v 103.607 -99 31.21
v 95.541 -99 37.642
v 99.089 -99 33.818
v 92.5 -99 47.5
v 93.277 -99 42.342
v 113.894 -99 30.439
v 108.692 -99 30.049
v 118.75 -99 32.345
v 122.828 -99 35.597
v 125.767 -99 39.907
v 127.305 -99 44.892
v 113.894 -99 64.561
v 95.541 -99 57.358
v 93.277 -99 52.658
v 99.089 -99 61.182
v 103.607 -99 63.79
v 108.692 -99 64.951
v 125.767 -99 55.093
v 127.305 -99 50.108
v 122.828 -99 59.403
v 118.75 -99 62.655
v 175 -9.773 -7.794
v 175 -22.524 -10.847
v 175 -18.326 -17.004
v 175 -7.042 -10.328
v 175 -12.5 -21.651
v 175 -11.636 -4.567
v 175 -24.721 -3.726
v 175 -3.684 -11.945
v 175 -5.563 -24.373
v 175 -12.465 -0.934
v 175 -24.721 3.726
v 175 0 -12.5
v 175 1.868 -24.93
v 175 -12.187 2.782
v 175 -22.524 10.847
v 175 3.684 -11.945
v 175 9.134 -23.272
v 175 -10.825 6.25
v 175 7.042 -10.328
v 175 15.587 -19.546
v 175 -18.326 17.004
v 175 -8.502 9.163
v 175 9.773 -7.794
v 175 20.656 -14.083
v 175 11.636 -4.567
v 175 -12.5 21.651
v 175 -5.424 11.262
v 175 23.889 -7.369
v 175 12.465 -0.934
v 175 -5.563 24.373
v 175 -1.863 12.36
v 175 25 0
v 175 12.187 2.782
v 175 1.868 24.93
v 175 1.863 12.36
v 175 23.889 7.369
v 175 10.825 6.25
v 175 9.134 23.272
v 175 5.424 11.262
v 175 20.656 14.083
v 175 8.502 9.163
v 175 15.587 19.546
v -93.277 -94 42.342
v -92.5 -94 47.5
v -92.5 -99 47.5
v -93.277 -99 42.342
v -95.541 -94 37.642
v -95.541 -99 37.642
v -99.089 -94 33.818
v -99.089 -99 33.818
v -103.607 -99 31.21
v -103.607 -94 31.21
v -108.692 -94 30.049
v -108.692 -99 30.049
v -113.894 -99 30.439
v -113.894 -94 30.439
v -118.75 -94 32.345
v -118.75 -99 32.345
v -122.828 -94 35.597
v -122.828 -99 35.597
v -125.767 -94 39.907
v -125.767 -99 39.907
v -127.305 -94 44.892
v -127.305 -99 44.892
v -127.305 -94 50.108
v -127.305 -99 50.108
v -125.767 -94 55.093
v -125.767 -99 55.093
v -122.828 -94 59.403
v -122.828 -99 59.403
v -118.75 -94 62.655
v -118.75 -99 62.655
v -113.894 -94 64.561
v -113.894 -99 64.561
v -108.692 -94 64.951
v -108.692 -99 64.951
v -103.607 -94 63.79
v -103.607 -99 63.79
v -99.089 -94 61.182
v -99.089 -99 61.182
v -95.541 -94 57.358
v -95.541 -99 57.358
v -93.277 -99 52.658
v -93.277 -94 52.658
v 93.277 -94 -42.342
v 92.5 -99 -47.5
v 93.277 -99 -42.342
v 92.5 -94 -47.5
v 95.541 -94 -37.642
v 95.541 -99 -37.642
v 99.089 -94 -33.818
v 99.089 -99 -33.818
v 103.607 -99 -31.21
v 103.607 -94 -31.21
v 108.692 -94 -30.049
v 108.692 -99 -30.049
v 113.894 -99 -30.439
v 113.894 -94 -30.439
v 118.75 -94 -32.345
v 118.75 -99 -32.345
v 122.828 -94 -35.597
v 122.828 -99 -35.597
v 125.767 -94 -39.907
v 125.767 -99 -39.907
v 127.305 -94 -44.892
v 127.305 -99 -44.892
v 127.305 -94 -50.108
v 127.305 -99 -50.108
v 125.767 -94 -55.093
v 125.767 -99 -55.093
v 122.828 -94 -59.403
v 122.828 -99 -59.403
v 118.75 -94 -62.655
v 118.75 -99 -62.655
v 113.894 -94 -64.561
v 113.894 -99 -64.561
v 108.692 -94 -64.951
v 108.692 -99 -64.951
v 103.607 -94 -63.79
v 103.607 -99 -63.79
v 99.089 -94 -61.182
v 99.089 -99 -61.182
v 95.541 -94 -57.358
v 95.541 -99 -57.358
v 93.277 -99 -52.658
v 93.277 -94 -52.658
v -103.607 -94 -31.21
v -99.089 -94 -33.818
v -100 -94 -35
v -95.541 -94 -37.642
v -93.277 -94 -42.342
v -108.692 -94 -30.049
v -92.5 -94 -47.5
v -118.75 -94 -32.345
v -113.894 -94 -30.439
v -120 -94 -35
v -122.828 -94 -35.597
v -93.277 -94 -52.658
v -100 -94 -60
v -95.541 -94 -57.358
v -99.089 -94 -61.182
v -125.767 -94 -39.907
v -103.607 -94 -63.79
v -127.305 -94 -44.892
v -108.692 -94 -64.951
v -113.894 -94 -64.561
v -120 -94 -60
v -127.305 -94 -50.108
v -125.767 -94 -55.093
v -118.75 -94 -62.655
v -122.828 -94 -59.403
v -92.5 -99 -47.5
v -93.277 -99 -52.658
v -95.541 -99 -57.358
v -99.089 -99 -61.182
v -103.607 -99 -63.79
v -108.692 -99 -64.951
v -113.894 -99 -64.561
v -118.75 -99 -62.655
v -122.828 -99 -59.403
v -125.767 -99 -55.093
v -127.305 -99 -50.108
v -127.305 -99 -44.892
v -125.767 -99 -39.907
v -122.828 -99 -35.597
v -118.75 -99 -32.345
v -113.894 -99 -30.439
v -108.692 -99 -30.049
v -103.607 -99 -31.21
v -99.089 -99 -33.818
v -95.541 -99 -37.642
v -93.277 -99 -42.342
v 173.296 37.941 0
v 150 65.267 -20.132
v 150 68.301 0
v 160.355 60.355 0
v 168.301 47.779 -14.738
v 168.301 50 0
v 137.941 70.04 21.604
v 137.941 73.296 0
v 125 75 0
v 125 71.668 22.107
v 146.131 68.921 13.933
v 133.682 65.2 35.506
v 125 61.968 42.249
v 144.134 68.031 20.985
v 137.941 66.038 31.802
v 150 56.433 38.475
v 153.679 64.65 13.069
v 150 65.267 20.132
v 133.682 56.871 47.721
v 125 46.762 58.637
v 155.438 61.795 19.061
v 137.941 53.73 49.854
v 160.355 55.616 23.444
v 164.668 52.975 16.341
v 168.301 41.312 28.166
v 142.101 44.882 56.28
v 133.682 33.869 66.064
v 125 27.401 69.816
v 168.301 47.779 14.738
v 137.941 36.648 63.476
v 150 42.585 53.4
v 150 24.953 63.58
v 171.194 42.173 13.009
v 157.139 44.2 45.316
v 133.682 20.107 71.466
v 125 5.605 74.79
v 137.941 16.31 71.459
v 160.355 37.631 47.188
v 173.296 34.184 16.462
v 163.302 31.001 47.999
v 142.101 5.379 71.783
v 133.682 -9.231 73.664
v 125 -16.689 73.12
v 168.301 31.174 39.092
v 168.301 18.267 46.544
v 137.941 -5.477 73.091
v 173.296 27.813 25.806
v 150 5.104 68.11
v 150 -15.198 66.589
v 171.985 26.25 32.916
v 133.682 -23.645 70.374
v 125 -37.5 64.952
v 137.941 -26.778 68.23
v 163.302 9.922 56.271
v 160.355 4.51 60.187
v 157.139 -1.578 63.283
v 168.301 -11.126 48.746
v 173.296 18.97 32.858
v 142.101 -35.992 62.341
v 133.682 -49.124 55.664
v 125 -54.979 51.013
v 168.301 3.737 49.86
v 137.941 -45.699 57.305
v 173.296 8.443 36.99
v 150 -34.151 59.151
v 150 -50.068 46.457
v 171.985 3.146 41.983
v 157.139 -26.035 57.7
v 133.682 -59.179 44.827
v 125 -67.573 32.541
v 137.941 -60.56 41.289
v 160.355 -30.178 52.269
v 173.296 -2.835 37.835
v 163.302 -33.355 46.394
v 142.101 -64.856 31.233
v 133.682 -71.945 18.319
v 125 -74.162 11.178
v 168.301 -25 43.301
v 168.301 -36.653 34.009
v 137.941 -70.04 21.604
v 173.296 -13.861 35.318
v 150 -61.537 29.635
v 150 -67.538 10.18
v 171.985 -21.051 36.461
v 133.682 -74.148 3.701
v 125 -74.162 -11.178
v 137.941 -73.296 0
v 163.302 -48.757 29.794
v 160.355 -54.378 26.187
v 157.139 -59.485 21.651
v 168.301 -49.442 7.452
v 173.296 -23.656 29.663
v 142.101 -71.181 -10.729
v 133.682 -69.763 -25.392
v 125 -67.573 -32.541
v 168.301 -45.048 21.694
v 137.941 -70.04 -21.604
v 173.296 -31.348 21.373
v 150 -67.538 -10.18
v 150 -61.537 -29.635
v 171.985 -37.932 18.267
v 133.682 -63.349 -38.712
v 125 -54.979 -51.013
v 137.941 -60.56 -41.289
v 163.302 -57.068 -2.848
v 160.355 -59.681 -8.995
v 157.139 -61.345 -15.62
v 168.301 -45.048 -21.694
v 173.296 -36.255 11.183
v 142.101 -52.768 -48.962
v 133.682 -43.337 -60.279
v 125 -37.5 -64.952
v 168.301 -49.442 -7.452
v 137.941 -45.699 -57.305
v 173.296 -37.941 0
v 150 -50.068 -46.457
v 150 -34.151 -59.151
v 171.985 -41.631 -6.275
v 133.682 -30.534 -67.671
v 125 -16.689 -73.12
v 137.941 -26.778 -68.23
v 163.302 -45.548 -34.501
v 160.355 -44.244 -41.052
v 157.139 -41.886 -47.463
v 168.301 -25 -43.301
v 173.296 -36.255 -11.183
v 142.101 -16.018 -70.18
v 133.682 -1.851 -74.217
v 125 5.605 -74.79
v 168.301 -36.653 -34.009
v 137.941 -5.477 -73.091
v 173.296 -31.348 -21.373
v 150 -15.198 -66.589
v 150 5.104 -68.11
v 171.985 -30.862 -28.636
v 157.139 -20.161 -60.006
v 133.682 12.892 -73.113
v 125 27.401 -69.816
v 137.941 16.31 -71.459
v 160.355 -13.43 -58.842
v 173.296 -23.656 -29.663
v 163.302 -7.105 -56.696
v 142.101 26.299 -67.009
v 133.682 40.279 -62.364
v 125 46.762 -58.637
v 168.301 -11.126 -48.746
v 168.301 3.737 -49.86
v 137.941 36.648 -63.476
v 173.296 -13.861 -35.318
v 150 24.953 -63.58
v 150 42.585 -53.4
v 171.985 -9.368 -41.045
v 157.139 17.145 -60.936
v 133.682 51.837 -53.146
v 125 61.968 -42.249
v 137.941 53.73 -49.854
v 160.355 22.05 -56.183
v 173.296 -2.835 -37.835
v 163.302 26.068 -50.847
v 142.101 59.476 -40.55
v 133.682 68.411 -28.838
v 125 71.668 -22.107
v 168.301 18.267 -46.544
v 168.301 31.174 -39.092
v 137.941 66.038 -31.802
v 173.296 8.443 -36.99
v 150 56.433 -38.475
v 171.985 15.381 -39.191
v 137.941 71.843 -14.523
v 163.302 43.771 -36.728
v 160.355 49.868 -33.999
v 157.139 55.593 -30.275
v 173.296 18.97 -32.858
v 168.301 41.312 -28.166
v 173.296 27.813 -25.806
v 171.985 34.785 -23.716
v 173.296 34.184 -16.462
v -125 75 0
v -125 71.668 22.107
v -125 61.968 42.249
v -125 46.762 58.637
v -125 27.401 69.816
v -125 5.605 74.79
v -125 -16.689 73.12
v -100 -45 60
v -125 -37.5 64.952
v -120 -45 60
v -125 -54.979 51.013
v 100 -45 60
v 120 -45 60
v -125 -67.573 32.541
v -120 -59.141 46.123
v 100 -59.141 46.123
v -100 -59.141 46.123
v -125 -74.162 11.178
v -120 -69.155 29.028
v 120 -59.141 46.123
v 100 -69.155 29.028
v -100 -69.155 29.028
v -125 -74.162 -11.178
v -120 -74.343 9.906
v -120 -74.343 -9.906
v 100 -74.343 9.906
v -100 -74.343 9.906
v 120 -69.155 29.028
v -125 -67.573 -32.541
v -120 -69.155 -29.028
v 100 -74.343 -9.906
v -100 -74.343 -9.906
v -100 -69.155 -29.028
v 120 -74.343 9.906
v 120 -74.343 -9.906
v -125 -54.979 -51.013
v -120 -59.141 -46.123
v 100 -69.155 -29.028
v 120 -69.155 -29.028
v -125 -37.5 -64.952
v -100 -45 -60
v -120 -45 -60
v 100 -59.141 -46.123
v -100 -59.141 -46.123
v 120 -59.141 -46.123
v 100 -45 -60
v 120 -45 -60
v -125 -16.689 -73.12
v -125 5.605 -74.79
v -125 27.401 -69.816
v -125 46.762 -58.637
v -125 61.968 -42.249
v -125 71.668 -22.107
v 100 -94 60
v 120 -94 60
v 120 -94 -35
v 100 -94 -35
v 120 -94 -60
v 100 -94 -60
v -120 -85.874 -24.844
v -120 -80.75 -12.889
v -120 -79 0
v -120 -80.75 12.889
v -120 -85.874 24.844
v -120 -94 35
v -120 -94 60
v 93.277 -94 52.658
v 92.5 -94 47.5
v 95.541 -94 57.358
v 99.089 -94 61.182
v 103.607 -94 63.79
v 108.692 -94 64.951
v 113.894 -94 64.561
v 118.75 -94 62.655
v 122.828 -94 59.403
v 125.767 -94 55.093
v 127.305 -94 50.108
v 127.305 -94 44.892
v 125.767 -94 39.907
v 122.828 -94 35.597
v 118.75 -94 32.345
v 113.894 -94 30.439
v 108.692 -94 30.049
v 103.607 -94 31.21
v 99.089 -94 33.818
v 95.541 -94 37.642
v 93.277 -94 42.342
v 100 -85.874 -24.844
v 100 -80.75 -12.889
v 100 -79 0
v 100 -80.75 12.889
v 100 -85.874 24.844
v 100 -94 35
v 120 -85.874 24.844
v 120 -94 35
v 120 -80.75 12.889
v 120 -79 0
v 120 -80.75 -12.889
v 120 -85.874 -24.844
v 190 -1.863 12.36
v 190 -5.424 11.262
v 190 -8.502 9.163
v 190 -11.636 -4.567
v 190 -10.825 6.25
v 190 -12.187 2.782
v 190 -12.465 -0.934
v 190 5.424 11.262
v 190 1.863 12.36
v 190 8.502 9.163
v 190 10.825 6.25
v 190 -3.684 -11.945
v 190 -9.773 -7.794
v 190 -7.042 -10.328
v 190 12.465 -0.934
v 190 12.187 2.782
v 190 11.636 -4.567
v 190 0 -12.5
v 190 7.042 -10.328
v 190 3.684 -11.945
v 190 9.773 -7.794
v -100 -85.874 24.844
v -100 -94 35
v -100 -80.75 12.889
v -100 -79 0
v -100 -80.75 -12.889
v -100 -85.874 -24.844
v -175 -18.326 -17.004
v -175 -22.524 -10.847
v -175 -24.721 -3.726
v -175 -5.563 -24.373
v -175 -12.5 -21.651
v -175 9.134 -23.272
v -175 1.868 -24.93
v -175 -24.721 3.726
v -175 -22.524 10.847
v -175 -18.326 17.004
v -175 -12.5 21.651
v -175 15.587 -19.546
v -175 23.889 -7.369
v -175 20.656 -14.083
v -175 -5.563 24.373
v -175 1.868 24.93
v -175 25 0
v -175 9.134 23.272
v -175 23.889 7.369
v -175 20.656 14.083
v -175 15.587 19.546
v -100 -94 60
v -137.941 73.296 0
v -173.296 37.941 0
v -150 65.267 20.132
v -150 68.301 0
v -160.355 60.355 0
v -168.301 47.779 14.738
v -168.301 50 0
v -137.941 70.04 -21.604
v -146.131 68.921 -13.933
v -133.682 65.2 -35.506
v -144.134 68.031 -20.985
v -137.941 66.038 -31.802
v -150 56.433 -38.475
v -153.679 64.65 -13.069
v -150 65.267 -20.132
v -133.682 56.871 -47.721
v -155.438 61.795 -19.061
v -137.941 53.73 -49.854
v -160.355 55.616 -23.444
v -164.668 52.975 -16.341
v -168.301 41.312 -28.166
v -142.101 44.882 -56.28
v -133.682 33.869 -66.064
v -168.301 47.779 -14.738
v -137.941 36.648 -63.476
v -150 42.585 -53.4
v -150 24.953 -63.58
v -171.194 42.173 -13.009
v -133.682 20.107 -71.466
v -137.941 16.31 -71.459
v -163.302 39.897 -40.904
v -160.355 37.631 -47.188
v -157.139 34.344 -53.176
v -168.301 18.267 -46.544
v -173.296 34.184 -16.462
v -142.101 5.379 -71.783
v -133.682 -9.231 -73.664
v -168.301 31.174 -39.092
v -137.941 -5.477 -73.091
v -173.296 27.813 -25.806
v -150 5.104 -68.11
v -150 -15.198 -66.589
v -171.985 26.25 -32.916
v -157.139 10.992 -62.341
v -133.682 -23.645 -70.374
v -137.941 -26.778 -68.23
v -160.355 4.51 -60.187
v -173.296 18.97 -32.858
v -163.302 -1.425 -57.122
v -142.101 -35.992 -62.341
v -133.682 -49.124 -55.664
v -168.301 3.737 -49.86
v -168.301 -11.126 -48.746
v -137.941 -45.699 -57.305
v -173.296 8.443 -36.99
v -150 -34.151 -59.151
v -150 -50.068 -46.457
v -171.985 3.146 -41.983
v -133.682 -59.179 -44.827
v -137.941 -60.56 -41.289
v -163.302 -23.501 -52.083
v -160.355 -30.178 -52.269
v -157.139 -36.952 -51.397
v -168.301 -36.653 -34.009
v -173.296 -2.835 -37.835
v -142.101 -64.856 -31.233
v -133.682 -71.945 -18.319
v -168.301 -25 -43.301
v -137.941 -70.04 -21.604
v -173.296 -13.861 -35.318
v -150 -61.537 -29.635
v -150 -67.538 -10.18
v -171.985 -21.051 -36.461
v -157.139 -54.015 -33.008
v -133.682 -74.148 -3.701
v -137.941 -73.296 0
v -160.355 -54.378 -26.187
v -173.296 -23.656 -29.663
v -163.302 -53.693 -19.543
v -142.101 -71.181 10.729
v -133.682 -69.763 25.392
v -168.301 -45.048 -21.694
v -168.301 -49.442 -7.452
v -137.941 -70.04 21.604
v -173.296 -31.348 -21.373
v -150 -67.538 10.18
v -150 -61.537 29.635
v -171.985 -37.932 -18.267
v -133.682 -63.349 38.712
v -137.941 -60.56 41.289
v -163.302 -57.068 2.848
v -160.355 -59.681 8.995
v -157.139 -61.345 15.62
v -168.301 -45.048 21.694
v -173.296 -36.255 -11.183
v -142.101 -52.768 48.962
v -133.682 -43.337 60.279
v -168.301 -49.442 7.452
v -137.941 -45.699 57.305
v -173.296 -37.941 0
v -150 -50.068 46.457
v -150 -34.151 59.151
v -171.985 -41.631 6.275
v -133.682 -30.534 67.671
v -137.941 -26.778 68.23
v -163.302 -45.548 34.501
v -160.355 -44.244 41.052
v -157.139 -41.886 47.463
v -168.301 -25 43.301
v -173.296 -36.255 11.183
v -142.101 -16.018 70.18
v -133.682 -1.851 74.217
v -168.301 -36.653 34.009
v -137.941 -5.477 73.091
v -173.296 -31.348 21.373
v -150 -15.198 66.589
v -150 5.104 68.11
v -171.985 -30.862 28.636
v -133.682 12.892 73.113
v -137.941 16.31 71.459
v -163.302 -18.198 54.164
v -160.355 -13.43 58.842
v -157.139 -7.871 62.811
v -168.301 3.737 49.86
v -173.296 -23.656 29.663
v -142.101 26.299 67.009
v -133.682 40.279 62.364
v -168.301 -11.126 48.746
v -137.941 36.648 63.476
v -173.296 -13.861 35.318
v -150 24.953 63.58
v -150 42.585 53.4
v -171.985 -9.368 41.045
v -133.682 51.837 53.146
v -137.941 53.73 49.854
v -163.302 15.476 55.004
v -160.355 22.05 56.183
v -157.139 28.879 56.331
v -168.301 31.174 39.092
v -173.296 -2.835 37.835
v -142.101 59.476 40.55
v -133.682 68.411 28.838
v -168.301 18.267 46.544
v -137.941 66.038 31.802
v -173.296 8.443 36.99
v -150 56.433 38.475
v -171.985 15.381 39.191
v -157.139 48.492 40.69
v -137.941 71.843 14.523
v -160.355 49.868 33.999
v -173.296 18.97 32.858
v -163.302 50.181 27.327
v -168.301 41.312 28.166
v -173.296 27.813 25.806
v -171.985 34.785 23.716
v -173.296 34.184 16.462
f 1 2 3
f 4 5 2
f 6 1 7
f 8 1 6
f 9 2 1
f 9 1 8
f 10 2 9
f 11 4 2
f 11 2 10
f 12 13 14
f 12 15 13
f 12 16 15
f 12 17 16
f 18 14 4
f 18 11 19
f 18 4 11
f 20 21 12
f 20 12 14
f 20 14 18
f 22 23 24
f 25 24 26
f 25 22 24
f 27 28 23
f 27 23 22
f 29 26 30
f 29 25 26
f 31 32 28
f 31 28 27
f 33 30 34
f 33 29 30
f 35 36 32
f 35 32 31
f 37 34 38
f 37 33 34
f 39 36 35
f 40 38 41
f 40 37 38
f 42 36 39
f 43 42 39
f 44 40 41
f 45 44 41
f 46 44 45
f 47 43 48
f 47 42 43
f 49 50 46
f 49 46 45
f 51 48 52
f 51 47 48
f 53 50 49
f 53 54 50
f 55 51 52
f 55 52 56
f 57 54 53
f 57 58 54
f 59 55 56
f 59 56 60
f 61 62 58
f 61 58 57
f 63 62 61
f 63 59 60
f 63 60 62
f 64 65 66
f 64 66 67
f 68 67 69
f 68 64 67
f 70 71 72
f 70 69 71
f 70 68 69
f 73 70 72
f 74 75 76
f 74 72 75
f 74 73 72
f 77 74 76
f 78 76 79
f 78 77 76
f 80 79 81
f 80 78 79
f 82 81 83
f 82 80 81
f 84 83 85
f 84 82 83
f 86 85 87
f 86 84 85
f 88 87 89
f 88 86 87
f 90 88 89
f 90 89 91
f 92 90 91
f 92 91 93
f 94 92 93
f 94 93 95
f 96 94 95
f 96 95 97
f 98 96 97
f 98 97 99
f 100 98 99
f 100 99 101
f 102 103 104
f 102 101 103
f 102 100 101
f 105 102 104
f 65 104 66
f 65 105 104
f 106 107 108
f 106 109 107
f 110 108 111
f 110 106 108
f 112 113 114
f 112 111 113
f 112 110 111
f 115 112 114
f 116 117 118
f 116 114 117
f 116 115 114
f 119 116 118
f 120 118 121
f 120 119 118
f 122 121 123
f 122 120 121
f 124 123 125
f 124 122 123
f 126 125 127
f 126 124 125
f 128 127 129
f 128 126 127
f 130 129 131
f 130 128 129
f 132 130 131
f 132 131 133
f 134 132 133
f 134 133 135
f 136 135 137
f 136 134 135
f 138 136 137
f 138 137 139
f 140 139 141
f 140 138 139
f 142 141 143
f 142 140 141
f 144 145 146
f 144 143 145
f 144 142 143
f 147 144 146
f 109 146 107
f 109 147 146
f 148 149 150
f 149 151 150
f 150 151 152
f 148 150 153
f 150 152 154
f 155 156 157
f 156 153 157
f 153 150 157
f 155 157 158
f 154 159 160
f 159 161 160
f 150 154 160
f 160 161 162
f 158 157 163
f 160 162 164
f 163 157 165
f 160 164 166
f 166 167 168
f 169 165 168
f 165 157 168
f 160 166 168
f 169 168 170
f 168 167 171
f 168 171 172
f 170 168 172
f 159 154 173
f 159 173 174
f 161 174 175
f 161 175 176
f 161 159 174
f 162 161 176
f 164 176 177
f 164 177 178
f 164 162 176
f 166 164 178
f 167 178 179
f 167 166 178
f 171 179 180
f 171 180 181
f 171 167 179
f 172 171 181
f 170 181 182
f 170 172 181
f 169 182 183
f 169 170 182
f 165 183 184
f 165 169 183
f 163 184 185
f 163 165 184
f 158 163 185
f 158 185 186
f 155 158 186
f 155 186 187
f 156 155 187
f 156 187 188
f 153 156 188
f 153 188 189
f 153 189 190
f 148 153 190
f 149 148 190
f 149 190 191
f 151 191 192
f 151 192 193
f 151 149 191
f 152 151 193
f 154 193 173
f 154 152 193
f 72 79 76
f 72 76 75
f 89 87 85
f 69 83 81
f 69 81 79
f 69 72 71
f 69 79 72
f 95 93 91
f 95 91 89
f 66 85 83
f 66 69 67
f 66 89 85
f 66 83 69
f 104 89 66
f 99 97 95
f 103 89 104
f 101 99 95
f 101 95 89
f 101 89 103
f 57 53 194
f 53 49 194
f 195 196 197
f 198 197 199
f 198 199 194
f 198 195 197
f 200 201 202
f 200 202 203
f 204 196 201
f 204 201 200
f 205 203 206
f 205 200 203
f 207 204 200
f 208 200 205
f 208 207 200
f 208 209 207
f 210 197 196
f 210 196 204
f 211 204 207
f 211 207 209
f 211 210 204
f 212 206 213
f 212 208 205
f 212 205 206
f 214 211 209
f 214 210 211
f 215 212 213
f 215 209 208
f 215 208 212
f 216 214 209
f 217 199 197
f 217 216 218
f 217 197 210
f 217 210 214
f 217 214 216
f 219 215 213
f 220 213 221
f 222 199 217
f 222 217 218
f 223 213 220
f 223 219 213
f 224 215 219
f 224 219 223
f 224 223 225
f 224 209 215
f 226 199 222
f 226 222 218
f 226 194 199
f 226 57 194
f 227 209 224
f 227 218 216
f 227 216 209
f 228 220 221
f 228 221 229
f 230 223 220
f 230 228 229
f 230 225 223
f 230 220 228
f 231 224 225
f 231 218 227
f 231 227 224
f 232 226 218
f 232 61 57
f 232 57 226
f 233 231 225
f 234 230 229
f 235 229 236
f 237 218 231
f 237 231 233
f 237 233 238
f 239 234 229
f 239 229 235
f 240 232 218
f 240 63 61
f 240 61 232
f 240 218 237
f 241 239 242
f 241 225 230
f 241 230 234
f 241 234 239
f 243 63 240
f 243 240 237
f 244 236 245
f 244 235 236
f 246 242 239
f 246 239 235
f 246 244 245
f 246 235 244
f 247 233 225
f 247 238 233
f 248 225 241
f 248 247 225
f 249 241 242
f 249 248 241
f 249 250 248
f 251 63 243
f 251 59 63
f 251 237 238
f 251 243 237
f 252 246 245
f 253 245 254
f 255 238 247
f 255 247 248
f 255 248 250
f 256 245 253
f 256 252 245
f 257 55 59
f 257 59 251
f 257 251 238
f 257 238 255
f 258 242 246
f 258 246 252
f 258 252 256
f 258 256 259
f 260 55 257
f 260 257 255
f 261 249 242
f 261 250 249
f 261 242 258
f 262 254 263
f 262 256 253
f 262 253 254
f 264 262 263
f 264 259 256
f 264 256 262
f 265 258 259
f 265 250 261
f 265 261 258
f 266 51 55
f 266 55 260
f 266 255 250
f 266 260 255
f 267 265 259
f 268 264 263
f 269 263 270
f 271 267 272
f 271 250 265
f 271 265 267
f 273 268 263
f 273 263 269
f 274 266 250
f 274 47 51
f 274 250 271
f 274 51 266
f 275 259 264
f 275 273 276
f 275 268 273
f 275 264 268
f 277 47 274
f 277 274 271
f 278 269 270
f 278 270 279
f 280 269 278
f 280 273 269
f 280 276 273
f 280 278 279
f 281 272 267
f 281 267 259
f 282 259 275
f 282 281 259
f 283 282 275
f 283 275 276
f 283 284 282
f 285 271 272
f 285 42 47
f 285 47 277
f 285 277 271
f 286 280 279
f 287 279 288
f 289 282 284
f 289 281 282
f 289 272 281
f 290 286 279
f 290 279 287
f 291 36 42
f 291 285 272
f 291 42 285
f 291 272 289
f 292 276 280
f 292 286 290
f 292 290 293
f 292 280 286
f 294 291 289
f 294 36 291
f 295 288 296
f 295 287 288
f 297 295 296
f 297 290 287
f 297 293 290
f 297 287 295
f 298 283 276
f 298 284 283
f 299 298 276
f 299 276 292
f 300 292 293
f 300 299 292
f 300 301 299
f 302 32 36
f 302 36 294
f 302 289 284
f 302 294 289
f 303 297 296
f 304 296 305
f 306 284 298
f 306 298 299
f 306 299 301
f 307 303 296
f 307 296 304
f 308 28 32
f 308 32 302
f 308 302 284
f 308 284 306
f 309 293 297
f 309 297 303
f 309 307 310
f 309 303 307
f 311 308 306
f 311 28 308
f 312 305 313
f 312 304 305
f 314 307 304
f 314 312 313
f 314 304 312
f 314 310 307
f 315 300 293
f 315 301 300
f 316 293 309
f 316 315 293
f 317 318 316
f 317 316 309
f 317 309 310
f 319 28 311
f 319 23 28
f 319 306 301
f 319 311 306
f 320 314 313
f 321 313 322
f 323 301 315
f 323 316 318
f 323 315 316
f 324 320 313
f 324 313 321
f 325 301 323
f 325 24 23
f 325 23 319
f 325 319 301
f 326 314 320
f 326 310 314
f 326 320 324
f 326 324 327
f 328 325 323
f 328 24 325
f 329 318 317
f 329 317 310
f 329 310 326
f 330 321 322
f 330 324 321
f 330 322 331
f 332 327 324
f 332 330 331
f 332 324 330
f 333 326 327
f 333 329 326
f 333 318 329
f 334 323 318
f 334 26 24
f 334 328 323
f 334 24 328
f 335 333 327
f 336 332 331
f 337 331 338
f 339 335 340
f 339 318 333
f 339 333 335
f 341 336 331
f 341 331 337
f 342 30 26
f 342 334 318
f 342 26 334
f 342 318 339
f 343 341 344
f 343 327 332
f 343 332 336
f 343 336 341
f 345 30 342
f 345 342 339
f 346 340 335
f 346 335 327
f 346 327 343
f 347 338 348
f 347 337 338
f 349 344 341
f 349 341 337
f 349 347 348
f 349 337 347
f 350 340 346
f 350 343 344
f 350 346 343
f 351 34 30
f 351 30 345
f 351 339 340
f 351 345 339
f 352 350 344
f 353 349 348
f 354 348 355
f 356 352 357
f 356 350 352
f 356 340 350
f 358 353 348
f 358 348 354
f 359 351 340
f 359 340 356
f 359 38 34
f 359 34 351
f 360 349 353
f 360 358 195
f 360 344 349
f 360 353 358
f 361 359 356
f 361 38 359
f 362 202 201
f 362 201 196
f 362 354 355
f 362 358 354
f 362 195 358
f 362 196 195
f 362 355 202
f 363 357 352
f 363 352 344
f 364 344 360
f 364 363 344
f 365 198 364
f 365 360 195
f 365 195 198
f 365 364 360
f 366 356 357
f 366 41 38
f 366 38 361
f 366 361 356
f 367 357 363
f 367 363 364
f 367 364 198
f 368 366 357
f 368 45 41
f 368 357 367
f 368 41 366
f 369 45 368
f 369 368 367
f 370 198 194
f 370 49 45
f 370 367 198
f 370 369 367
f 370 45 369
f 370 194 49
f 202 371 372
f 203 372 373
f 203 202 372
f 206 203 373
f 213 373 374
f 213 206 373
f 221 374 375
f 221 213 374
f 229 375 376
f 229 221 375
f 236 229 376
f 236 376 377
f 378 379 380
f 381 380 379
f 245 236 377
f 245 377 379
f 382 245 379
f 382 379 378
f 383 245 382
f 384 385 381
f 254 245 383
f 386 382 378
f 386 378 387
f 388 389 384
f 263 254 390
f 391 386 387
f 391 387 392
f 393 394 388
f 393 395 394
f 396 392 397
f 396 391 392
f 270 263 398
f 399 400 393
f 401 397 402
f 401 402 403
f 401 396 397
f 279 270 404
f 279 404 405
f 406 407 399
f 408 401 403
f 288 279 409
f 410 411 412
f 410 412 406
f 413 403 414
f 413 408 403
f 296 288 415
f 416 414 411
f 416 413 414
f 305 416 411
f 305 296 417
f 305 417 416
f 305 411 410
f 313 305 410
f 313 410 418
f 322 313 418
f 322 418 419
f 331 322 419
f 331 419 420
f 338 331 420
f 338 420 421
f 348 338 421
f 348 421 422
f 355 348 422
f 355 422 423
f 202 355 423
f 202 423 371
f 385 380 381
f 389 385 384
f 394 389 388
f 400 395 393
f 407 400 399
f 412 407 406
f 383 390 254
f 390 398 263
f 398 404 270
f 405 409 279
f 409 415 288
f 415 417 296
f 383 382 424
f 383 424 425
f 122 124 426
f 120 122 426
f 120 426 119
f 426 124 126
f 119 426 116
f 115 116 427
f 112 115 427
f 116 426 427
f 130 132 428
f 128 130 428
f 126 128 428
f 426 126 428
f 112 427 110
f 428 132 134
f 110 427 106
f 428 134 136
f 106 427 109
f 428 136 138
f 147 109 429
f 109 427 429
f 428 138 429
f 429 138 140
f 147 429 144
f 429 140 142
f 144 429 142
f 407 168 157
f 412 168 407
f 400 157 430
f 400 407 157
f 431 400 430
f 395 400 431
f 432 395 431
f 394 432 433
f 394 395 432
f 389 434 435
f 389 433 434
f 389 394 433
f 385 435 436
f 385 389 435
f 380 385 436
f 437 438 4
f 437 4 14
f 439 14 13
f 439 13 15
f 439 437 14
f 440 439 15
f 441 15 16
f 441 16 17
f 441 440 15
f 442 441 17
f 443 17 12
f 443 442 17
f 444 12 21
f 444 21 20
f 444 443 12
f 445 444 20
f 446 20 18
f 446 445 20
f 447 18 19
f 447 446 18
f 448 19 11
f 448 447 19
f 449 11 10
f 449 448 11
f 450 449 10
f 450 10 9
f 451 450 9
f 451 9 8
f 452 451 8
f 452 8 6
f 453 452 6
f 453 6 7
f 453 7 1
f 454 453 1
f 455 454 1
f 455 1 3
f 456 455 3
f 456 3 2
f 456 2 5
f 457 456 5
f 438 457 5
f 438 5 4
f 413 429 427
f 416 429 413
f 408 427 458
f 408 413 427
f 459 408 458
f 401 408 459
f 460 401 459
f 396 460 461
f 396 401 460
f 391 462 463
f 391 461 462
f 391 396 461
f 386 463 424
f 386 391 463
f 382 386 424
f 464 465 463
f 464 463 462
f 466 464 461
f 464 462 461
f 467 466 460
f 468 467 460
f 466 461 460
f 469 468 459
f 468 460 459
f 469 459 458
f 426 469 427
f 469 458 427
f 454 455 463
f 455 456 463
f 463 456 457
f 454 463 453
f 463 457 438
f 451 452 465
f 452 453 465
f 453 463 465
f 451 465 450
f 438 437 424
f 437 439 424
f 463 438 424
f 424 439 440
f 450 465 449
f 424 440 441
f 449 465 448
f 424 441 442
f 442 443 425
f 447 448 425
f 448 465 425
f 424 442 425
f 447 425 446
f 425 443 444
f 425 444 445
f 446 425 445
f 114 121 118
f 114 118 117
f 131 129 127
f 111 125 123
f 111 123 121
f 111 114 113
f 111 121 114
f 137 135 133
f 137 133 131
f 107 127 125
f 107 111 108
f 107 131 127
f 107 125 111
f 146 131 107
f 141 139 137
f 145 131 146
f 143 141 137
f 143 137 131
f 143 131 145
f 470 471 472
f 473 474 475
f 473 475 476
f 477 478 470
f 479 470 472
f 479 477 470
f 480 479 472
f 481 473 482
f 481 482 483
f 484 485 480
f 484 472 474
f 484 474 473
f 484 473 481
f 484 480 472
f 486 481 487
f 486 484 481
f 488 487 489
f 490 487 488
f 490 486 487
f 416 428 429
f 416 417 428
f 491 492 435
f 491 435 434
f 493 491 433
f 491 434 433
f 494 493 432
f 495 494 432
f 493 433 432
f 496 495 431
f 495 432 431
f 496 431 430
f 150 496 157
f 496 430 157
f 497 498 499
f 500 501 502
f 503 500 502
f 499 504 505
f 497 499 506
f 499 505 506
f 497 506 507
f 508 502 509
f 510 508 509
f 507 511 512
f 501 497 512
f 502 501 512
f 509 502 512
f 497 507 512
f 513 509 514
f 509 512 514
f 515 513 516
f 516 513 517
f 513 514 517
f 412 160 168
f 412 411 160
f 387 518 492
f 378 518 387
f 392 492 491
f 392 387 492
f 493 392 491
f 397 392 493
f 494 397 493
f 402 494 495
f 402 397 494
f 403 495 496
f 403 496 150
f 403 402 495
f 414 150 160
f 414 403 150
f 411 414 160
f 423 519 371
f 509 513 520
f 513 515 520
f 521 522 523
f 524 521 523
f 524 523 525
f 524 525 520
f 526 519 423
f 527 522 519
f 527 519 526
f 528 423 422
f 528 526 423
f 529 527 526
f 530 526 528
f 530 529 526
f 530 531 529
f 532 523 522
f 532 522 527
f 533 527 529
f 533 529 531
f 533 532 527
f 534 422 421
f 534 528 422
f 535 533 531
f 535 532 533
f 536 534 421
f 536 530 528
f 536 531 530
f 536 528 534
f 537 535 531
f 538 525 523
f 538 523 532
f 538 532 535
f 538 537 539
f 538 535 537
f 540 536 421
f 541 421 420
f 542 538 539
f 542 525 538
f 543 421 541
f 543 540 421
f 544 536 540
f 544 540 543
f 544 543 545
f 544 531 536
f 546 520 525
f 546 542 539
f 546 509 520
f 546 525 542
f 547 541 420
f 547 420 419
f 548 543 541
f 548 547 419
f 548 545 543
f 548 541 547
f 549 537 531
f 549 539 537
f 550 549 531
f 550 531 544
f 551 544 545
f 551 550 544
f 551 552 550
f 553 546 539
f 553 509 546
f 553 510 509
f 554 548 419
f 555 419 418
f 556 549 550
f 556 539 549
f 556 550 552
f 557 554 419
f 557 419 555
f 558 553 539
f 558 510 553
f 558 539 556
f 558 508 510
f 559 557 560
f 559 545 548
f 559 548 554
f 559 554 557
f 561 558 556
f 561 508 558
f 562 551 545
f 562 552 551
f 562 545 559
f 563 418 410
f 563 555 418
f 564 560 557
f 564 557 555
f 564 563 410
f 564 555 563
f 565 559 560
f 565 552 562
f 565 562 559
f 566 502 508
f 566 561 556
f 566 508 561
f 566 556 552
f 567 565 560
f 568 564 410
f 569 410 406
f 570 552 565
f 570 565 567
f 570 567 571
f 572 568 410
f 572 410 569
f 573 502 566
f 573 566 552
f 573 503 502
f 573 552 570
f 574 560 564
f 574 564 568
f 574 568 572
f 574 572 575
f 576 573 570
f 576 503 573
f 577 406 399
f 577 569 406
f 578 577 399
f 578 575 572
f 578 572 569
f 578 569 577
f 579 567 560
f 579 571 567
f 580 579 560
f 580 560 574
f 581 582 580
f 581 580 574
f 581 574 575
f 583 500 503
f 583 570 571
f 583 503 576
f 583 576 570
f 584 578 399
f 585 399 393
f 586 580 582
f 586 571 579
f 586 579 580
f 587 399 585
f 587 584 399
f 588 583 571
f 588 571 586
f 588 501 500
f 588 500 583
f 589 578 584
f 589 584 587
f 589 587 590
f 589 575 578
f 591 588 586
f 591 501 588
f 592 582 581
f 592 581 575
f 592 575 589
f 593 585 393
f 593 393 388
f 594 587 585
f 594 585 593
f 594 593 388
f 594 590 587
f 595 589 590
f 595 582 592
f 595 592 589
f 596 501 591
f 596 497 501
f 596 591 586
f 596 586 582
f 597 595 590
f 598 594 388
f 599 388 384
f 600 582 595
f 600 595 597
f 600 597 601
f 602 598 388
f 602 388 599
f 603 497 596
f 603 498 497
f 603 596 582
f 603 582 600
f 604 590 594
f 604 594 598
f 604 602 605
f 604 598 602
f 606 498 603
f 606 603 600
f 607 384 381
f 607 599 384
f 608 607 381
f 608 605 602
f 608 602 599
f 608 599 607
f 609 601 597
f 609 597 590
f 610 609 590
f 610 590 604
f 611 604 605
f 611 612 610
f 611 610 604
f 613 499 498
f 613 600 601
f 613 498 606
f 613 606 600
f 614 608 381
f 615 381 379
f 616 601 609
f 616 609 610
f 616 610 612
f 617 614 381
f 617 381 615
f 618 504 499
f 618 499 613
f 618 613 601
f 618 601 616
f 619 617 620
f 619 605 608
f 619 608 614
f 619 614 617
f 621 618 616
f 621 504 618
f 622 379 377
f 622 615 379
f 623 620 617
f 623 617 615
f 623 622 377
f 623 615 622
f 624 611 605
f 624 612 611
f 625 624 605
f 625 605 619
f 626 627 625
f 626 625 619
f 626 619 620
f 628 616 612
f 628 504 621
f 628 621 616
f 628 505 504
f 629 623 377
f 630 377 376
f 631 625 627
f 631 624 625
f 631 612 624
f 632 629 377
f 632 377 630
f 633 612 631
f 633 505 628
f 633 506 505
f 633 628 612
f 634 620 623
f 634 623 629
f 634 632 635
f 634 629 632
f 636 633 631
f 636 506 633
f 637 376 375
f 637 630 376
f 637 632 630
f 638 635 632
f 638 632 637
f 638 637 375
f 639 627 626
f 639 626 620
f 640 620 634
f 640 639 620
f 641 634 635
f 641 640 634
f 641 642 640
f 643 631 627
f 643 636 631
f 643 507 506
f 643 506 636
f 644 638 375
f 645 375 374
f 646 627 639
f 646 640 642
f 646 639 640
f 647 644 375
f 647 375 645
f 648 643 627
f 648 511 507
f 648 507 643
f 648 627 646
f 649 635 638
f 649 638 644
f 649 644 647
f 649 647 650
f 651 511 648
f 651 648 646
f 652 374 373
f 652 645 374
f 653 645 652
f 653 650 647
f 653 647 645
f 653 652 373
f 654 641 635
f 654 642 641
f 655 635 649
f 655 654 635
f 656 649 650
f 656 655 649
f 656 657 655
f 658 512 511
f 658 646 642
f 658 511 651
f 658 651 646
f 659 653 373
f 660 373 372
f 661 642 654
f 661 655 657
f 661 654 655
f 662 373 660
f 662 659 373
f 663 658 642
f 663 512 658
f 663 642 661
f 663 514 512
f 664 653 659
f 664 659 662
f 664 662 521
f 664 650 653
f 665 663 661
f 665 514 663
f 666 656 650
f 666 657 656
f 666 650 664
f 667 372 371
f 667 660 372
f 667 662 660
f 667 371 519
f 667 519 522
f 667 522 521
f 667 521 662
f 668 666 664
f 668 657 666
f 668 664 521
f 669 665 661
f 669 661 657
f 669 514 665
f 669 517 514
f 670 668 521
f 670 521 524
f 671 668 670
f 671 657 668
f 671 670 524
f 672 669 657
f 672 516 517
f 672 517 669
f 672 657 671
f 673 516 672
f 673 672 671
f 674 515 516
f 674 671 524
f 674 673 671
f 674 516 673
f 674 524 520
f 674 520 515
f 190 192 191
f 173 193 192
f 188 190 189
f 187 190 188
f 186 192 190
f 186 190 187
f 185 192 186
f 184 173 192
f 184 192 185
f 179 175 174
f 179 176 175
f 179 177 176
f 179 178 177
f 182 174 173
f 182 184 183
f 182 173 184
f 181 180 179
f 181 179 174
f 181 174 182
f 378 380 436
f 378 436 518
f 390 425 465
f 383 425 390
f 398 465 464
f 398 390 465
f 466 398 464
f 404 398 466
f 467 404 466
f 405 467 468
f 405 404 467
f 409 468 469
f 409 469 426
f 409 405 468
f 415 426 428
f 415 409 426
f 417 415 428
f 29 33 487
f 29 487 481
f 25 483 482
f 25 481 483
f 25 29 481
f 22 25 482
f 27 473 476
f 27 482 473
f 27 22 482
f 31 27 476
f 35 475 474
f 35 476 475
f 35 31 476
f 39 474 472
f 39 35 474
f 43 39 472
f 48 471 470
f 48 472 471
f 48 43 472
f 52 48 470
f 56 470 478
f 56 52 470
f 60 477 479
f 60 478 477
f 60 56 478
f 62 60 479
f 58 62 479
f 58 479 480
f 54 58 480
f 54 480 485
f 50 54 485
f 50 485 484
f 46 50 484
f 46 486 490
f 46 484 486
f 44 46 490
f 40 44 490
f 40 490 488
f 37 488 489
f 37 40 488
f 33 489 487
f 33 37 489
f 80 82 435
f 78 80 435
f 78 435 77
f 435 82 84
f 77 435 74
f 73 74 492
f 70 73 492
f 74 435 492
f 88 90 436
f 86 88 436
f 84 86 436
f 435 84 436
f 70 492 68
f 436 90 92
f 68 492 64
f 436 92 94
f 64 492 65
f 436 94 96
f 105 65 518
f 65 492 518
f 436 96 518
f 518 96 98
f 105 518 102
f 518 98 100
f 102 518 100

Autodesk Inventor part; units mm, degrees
ref_plane "YZ Plane" through (0, 0, 0) normal (1, 0, 0) x (0, 1, 0)
ref_plane "XZ Plane" through (0, 0, 0) normal (0, 1, 0) x (-1, 0, 0)
ref_plane "XY Plane" through (0, 0, 0) normal (0, 0, 1) x (1, 0, 0)
sketch "Sketch2" plane through (0, 0, 0) normal (1, 0, 0) x (0, 1, 0)
  circle A0 centre (0, 0) radius 75
  dimension "d2" = 150
extrude "Extrusion1" add sketch "Sketch2" along normal mid plane 350
fillet "Fillet1" radius 50 2 edges at (-175, -75, 0) (175, -75, 0)
sketch "Sketch3" plane through (175, 0, 0) normal (1, 0, 0) x (0, 0, -1)
  circle A0 centre (0, 0) radius 12.5
  dimension "d6" = 25
extrude "Extrusion2" add sketch "Sketch3" along normal blind 15
sketch "Sketch4" plane through (0, 0, 0) normal (0, 1, 0) x (-1, 0, 0)
  line L0 (120, 60) -> (100, 60)
  line L1 (100, 60) -> (100, -60)
  line L2 (100, -60) -> (120, -60)
  line L3 (120, -60) -> (120, 60)
  line L4 (120, 60) -> (100, -60) construction
  line L5 (100, 60) -> (120, -60) construction
  point P0 (0, 0)
  point P1 (110, 0)
  dimension "d9" = 20
  dimension "d10" = 120
extrude "Extrusion3" add sketch "Sketch4" against normal blind 94
mirror "Mirror1" about plane through (0, 0, 0) normal (1, 0, 0) of "Extrusion3"
sketch "Sketch5" plane through (-120, -94, -60) normal (-1, 0, 0) x (0, 0, 1)
  line L0 (0, 0) -> (120, 0) projected
  line L1 (0, 0) -> (25, 0)
  line L2 (25, 0) -> (25, 15)
  line L3 (25, 15) -> (0, 15)
  line L4 (0, 15) -> (0, 0)
  line L5 (95, 15) -> (120, 15)
  line L6 (120, 15) -> (120, 0)
  line L7 (120, 0) -> (95, 0)
  line L8 (95, 0) -> (95, 15)
  arc A0 (95, 0) -> (25, 0) centre (60, -33.3333) ccw
  line L9 (25, 0) -> (95, 0)
  point P0 (60, 94)
  dimension "d13" = 25
  dimension "d14" = 15
  dimension "d15" = 25
extrude "Extrusion4" cut sketch "Sketch5" against normal up to surface (240 mm away) contours A0 L0
sketch "Sketch7" plane through (0, -94, 0) normal (0, -1, 0) x (1, 0, 0)
  line L0 (-120, 35) -> (-100, 35) projected
  line L1 (-100, 35) -> (-100, 60) projected
  line L2 (-100, 60) -> (-120, 60) projected
  line L3 (-120, 60) -> (-120, 35) projected
  circle A0 centre (-110, 47.5) radius 17.5
  point P0 (0, 0)
  dimension "d18" = 35
extrude "Extrusion5" add sketch "Sketch7" along normal blind 5 contours L3 L2 L1 L0 | A0
mirror "Mirror2" about plane through (0, 0, 0) normal (0, 0, 1) of "Extrusion5"
mirror "Mirror3" about plane through (0, 0, 0) normal (1, 0, 0) of "Extrusion5", "Mirror2"
equation "\"d15\" = d13"
equation "\"BendRadius\" = Thickness"
equation "\"BendReliefWidth\" = Thickness"
equation "\"BendReliefDepth\" = 0.5 * Thickness"
equation "\"CornerReliefSize\" = 4 * Thickness"
equation "\"MinimumRemnant\" = 2 * Thickness"
equation "\"TransitionRadius\" = BendRadius"
equation "\"JacobiRadiusSize\" = BendRadius"
equation "\"GapSize\" = Thickness"
equation "\"Thickness\" = 3.048"
